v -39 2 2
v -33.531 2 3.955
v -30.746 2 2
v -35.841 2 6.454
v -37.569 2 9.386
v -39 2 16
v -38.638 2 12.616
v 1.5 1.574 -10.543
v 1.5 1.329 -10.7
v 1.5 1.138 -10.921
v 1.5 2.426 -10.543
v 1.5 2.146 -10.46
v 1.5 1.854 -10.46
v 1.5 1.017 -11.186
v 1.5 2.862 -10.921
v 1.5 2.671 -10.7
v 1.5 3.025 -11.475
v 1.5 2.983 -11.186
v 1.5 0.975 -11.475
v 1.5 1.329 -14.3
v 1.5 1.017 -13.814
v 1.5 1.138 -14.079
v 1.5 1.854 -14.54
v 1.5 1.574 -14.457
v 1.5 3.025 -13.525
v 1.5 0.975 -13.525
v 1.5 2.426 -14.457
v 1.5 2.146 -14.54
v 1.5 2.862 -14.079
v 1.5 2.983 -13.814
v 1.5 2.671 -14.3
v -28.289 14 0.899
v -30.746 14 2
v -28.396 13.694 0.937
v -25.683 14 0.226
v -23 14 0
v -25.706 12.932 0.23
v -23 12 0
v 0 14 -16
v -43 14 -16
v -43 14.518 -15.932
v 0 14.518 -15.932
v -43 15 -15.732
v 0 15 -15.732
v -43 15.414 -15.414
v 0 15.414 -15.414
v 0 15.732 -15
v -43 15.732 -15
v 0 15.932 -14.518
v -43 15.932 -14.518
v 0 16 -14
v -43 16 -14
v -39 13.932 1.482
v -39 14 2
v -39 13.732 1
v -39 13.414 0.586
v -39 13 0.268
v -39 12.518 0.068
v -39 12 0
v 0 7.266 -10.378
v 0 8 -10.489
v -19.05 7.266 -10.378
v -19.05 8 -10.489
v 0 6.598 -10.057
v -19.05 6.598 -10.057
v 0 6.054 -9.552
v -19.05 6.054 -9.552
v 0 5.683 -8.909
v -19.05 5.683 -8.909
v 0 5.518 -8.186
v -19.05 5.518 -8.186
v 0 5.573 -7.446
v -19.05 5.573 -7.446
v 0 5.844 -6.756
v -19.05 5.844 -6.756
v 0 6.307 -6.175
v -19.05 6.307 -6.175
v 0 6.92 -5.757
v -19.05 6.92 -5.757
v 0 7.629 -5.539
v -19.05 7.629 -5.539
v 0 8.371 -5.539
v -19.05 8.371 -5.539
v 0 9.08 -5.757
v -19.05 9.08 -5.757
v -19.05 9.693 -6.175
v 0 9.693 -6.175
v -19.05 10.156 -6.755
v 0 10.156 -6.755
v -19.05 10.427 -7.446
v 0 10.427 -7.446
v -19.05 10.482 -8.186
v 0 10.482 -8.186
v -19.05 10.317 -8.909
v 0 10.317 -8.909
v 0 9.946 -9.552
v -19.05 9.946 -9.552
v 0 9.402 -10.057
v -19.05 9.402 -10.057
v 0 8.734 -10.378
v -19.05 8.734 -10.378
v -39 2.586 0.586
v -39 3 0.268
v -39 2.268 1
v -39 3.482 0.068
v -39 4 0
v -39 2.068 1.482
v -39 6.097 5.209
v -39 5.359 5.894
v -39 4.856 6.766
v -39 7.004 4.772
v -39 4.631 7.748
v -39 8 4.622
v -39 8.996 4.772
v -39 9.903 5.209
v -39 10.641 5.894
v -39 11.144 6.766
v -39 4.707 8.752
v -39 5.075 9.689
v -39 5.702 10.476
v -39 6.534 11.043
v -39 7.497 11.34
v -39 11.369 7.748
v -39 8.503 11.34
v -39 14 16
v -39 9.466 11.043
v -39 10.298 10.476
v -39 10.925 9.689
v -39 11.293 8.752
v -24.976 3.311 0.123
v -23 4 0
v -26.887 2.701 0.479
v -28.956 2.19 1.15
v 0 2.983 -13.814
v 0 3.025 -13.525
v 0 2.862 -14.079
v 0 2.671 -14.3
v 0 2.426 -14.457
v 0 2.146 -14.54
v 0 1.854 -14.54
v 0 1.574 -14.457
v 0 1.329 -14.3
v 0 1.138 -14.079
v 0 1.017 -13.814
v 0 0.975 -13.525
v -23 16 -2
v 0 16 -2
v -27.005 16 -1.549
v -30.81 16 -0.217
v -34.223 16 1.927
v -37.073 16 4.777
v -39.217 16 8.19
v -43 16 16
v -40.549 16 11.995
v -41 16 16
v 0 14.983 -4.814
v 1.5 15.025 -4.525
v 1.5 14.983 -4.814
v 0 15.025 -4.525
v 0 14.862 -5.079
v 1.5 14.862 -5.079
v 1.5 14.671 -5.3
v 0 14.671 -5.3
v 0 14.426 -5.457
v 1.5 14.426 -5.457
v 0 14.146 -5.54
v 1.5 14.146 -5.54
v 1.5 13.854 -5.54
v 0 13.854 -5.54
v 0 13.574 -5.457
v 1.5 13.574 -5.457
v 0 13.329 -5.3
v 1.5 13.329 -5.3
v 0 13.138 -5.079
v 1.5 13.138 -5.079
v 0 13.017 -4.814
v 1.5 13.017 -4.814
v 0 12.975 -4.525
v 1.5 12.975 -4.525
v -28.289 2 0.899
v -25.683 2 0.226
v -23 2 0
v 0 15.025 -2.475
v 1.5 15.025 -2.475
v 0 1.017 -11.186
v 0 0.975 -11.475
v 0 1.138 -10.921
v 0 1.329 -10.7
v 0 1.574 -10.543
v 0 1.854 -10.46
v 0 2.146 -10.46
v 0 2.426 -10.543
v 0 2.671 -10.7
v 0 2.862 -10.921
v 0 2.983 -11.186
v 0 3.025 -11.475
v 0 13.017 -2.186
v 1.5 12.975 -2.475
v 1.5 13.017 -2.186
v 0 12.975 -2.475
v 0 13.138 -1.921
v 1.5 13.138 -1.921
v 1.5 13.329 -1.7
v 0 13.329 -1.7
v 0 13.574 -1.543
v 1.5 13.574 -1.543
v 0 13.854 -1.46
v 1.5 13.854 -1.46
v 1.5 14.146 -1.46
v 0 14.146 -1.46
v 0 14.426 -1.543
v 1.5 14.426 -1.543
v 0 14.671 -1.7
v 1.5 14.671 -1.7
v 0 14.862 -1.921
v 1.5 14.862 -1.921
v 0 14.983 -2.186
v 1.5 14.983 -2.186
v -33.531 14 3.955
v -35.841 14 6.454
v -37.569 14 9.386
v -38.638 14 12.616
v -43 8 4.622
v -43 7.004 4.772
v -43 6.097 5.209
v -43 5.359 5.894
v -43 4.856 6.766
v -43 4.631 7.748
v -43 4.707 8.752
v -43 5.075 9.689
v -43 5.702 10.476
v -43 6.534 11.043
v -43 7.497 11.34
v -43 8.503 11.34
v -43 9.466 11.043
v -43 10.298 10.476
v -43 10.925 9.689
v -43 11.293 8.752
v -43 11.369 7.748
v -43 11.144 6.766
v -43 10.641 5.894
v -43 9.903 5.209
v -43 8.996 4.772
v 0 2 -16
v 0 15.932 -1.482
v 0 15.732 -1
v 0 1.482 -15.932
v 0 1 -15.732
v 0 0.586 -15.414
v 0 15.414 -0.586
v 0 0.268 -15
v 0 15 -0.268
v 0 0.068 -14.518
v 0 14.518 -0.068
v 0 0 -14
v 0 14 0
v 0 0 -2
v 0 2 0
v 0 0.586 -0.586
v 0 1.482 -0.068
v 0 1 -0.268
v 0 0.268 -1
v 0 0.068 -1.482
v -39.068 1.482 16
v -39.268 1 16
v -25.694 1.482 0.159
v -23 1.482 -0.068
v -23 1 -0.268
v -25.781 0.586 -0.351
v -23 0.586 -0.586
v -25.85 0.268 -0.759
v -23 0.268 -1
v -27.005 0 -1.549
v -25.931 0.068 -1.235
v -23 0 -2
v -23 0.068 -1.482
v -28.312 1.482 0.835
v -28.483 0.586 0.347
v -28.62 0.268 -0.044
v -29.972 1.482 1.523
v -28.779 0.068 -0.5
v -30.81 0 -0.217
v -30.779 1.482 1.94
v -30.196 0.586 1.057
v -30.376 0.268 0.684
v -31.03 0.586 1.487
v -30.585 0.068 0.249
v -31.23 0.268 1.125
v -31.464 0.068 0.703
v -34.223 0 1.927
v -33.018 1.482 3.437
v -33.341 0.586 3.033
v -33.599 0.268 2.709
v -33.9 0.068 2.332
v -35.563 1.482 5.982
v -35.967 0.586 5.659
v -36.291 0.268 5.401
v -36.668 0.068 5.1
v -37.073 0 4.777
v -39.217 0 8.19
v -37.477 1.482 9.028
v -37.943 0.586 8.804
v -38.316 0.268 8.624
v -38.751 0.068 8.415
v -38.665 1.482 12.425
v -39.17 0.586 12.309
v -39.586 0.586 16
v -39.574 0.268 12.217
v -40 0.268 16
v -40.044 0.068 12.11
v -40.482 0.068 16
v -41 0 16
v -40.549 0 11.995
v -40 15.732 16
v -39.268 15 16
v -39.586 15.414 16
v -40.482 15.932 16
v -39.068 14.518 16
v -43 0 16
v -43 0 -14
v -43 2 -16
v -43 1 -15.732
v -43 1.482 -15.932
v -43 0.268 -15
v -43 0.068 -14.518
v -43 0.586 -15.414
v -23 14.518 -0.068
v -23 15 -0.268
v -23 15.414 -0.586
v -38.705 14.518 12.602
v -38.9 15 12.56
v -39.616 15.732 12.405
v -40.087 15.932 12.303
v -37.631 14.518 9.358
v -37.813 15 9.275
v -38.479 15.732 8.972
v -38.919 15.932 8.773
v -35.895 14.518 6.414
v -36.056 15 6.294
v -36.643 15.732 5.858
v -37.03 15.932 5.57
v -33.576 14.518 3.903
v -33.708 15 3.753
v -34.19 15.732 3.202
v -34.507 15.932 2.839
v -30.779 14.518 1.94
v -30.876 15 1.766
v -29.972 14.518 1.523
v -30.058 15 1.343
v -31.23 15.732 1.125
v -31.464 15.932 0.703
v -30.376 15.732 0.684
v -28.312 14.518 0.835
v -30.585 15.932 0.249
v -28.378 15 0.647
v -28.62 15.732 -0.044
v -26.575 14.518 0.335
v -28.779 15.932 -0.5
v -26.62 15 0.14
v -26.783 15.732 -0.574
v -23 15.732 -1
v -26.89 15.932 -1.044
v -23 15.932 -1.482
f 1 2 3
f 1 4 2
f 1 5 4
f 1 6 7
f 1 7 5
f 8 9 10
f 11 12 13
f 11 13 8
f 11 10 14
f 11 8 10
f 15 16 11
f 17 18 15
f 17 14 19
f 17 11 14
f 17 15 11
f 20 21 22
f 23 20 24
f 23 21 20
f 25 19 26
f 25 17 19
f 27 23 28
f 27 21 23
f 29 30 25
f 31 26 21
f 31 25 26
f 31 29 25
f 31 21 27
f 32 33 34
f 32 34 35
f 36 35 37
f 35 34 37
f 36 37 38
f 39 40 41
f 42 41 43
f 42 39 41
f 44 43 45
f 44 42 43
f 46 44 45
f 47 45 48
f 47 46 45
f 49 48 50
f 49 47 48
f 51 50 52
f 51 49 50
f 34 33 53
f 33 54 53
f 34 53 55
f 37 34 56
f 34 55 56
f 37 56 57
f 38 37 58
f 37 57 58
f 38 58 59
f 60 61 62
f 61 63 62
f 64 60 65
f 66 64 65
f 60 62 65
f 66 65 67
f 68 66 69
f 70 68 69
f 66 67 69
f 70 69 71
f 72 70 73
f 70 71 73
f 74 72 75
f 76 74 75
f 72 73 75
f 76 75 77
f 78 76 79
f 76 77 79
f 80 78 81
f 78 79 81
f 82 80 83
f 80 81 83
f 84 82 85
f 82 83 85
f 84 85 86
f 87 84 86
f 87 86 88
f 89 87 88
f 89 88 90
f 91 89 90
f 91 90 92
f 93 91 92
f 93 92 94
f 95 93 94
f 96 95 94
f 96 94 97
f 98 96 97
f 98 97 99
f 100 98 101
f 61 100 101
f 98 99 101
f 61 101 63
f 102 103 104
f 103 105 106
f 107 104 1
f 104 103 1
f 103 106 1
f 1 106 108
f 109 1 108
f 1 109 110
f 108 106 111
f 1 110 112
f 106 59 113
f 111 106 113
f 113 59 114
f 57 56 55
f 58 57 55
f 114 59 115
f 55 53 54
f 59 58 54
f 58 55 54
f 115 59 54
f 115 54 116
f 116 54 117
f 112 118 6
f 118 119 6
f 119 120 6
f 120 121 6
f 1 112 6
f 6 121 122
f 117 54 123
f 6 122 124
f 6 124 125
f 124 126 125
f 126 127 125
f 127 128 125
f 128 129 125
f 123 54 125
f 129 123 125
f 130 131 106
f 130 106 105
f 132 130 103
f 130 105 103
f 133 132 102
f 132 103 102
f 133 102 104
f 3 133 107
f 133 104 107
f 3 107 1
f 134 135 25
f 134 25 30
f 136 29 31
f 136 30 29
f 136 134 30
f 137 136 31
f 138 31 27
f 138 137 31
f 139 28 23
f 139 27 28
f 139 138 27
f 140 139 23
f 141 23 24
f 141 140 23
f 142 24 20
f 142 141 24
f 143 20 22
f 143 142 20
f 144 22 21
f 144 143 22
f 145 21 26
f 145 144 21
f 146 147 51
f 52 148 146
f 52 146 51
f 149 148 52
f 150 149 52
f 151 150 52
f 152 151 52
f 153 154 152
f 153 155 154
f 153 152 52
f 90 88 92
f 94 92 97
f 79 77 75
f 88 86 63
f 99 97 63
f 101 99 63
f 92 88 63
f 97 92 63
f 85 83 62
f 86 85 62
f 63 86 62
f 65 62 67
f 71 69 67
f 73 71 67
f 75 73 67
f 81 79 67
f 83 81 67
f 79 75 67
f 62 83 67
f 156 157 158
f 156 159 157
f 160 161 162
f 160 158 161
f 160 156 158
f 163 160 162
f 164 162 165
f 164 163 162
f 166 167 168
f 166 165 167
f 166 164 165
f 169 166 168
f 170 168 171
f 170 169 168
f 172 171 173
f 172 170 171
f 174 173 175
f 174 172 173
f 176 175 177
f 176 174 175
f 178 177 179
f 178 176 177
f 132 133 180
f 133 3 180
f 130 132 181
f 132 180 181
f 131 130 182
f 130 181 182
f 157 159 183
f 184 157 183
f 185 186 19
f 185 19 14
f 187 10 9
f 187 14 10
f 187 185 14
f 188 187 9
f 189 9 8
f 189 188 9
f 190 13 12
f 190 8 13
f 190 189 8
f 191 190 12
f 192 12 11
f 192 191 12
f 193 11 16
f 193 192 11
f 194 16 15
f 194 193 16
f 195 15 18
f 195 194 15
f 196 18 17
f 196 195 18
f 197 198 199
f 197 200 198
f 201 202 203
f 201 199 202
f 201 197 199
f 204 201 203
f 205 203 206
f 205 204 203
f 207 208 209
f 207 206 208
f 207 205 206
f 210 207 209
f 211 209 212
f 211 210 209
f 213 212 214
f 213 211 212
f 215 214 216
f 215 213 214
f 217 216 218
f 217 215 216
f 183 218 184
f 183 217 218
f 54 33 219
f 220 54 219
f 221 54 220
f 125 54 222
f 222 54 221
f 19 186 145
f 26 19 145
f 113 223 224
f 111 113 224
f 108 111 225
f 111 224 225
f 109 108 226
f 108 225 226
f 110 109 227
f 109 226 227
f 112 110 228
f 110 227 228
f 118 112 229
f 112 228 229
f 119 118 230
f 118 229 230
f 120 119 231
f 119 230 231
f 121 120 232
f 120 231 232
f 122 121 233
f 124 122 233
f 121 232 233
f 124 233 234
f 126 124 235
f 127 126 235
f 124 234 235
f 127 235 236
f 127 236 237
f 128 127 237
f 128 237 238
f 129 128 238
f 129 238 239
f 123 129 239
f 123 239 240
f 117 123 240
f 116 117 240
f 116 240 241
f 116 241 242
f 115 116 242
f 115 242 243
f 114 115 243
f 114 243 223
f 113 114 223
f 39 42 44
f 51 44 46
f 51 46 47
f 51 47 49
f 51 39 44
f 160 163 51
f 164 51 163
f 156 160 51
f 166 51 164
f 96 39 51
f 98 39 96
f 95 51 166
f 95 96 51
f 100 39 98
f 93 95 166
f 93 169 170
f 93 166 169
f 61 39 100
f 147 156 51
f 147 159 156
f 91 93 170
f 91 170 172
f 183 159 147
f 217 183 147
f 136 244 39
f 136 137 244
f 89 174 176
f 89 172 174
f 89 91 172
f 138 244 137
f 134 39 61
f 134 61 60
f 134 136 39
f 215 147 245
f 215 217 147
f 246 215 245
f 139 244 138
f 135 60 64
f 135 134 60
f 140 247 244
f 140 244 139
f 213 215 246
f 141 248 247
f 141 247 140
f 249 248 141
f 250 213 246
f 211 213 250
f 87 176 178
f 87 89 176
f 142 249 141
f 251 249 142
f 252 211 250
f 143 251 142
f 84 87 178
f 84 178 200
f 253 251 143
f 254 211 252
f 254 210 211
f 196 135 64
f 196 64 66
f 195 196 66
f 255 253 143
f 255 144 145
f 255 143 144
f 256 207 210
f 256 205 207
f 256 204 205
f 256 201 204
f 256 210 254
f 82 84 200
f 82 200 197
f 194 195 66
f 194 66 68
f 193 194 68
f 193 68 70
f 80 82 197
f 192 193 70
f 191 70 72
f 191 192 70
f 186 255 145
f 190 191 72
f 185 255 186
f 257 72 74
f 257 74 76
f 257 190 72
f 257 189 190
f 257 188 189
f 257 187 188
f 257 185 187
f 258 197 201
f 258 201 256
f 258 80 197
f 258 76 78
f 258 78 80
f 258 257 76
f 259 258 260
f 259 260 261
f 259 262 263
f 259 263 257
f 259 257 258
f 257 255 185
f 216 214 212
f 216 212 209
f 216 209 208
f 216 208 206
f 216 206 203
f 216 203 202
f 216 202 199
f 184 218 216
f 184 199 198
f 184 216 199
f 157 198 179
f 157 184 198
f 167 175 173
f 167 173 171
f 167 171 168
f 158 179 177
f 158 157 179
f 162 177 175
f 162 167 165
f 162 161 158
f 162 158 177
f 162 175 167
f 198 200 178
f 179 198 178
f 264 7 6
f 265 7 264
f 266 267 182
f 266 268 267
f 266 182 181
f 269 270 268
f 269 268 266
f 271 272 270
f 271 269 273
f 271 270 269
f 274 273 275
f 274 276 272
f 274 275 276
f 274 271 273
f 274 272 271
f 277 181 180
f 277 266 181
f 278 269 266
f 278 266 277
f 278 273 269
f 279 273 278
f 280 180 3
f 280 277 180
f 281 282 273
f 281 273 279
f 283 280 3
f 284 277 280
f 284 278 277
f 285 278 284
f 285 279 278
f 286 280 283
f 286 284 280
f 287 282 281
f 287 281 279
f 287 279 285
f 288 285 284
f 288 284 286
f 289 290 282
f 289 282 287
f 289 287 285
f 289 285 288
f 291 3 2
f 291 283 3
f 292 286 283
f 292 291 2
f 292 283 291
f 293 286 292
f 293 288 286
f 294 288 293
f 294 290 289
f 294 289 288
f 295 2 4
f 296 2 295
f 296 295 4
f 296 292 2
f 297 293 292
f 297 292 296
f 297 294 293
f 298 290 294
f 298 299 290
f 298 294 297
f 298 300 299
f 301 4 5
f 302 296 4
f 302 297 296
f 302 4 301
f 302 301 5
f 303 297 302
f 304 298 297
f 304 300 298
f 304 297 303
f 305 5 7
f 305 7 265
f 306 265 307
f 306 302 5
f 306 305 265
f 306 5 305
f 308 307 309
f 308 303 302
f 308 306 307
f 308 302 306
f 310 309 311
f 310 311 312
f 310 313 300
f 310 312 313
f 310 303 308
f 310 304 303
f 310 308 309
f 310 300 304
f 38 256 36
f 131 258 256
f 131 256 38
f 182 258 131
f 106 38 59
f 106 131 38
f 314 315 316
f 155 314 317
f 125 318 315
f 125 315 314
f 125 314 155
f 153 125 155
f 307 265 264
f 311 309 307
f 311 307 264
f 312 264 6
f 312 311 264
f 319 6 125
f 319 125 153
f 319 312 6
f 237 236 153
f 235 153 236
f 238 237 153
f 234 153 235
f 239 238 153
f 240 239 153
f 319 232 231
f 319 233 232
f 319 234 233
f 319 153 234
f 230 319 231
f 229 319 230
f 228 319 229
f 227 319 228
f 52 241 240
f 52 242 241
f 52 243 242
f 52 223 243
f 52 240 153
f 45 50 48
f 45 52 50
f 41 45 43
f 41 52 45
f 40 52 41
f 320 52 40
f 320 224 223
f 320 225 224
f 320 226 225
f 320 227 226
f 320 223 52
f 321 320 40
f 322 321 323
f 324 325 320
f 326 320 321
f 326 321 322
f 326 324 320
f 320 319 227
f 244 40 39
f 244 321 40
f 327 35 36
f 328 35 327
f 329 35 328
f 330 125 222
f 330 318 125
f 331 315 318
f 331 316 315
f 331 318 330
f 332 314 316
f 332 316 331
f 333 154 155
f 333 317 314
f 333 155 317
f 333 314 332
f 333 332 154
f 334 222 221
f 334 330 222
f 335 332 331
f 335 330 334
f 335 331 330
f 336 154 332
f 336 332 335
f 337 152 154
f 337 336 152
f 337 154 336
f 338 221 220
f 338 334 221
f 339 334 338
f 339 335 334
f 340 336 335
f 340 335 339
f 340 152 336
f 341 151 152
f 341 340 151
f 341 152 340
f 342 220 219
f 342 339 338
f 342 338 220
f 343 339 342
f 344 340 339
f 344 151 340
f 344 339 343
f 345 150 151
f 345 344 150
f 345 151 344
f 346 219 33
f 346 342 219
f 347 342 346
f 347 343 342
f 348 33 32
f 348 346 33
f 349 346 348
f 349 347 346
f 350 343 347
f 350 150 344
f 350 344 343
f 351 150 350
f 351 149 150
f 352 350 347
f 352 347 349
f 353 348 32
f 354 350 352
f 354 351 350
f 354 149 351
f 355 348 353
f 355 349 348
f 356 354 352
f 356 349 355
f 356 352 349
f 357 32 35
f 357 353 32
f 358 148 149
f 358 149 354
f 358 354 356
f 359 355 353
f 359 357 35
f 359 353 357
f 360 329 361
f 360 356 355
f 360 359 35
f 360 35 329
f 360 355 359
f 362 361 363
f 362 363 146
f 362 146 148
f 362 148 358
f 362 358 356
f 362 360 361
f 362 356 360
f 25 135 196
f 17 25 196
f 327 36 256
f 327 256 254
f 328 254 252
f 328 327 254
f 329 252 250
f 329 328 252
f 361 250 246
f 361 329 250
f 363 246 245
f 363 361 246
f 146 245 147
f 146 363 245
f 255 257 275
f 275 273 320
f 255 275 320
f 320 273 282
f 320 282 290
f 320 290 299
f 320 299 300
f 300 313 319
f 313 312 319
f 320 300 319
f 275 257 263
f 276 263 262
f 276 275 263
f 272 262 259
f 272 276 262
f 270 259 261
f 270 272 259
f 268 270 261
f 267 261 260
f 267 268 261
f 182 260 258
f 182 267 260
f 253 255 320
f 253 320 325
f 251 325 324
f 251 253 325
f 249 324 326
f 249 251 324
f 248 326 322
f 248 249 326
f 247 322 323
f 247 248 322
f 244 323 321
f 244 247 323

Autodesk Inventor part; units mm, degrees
ref_plane "YZ Plane" through (0, 0, 0) normal (1, 0, 0) x (0, 1, 0)
ref_plane "XZ Plane" through (0, 0, 0) normal (0, 1, 0) x (-1, 0, 0)
ref_plane "XY Plane" through (0, 0, 0) normal (0, 0, 1) x (1, 0, 0)
sketch "Sketch1" plane through (0, 0, 0) normal (0, 1, 0) x (-1, 0, 0)
  line L0 (43, 16) -> (43, -16)
  line L1 (43, -16) -> (0, -16)
  line L2 (0, -16) -> (0, 0)
  line L3 (0, 0) -> (23, 0)
  line L4 (39, 16) -> (39, 16)
  line L5 (39, 16) -> (43, 16)
  arc A0 (23, 0) -> (39, 16) centre (23, 16) ccw
  dimension "d0" = 16
  dimension "d1" = 32
  dimension "d2" = 4
  dimension "d3" = 16
  dimension "d4" = 43
extrude "Extrusion1" add sketch "Sketch1" along normal blind 16
fillet "Fillet1" radius 2 6 edges at (-34.3137, 16, 4.6863) (-11.5, 16, 0) (-21.5, 16, -16) (-21.5, 0, -16) (-34.3137, 0, 4.6863) (-11.5, 0, 0)
ref_plane "Work Plane1" through (-39, 0, 16) normal (-1, 0, 0) x (0, 0, 1)
sketch "Sketch2" plane through (-39, 0, 16) normal (-1, 0, 0) x (0, 0, 1)
  line L0 (-16, 14) -> (0, 14) projected
  line L1 (0, 2) -> (-16, 2) projected
  line L2 (-14, 14) -> (0, 14)
  line L3 (0, 14) -> (0, 2)
  line L4 (0, 2) -> (-14, 2)
  line L5 (-16, 4) -> (-16, 12)
  arc A0 (-14, 14) -> (-16, 12) centre (-14, 12) ccw
  arc A1 (-16, 4) -> (-14, 2) centre (-14, 4) ccw
  point P0 (-16, 0)
  dimension "d9" = 2
  dimension "d10" = 16
extrude "Extrusion2" cut sketch "Sketch2" against normal blind 16
sketch "Sketch3" plane through (-39, 0, 16) normal (1, 0, 0) x (0, 0, -1)
  line L0 (0, 0) -> (18, 0) projected
  line L1 (18, 16) -> (0, 16) projected
  line L2 (0, 2) -> (0, 14) projected
  point P0 (16, 0)
  point P1 (8, 8)
  dimension "d13" = 16
  dimension "d14" = 8
  dimension "d15" = 8
hole "Hole1" at (-39, 8, 8) direction (-1, 0, 0) diameter 6.756 depth 8.8 clearance for "Flat Head Machine Screw (82)" size "1/4" standard "Ansi Unified Screw Threads"
sketch "Sketch4" plane through (0, 0, -2) normal (1, 0, 0) x (0, 0, -1)
  line L0 (0, 16) -> (12, 16) projected
  line L1 (14, 2) -> (14, 14) projected
  line L2 (0.475, 14) -> (2.525, 14) construction
  line L3 (0.475, 12.975) -> (2.525, 12.975)
  line L4 (2.525, 15.025) -> (0.475, 15.025)
  arc A0 (0.475, 15.025) -> (0.475, 12.975) centre (0.475, 14) ccw
  arc A1 (2.525, 12.975) -> (2.525, 15.025) centre (2.525, 14) ccw
  line L5 (9.475, 2) -> (11.525, 2) construction
  line L6 (9.475, 0.975) -> (11.525, 0.975)
  line L7 (11.525, 3.025) -> (9.475, 3.025)
  arc A2 (9.475, 3.025) -> (9.475, 0.975) centre (9.475, 2) ccw
  arc A3 (11.525, 0.975) -> (11.525, 3.025) centre (11.525, 2) ccw
  point P0 (-2, 0)
  point P1 (6, 8)
  point P2 (1.5, 14)
  point P3 (10.5, 2)
  dimension "d23" = 8
  dimension "d24" = 8
  dimension "d25" = 9
  dimension "d26" = 4.5
  dimension "d27" = 2.05
  dimension "d28" = 2.05
  dimension "d29" = 2.05
  dimension "d30" = 2.05
  dimension "d31" = 12
  dimension "d32" = 6
extrude "Extrusion3" add sketch "Sketch4" along normal blind 1.5
hole "Hole2" at (0, 8, -8) direction (-1, 0, 0) diameter 4.978 depth 19.05 thread size "1/4-20 UNC" class "2B" standard "ANSI Unified Screw Threads"
equation "\"d1\" = 2 * d0"
equation "\"d14\" = 0.5 * d13"
equation "\"d15\" = 0.5 * d13"
equation "\"d24\" = d23"
equation "\"d26\" = 0.5 * d25"
equation "\"d28\" = d27"
equation "\"d29\" = d28"
equation "\"d30\" = d29"
equation "\"d32\" = 0.5 * d31"
properties part number "vive_mount"
